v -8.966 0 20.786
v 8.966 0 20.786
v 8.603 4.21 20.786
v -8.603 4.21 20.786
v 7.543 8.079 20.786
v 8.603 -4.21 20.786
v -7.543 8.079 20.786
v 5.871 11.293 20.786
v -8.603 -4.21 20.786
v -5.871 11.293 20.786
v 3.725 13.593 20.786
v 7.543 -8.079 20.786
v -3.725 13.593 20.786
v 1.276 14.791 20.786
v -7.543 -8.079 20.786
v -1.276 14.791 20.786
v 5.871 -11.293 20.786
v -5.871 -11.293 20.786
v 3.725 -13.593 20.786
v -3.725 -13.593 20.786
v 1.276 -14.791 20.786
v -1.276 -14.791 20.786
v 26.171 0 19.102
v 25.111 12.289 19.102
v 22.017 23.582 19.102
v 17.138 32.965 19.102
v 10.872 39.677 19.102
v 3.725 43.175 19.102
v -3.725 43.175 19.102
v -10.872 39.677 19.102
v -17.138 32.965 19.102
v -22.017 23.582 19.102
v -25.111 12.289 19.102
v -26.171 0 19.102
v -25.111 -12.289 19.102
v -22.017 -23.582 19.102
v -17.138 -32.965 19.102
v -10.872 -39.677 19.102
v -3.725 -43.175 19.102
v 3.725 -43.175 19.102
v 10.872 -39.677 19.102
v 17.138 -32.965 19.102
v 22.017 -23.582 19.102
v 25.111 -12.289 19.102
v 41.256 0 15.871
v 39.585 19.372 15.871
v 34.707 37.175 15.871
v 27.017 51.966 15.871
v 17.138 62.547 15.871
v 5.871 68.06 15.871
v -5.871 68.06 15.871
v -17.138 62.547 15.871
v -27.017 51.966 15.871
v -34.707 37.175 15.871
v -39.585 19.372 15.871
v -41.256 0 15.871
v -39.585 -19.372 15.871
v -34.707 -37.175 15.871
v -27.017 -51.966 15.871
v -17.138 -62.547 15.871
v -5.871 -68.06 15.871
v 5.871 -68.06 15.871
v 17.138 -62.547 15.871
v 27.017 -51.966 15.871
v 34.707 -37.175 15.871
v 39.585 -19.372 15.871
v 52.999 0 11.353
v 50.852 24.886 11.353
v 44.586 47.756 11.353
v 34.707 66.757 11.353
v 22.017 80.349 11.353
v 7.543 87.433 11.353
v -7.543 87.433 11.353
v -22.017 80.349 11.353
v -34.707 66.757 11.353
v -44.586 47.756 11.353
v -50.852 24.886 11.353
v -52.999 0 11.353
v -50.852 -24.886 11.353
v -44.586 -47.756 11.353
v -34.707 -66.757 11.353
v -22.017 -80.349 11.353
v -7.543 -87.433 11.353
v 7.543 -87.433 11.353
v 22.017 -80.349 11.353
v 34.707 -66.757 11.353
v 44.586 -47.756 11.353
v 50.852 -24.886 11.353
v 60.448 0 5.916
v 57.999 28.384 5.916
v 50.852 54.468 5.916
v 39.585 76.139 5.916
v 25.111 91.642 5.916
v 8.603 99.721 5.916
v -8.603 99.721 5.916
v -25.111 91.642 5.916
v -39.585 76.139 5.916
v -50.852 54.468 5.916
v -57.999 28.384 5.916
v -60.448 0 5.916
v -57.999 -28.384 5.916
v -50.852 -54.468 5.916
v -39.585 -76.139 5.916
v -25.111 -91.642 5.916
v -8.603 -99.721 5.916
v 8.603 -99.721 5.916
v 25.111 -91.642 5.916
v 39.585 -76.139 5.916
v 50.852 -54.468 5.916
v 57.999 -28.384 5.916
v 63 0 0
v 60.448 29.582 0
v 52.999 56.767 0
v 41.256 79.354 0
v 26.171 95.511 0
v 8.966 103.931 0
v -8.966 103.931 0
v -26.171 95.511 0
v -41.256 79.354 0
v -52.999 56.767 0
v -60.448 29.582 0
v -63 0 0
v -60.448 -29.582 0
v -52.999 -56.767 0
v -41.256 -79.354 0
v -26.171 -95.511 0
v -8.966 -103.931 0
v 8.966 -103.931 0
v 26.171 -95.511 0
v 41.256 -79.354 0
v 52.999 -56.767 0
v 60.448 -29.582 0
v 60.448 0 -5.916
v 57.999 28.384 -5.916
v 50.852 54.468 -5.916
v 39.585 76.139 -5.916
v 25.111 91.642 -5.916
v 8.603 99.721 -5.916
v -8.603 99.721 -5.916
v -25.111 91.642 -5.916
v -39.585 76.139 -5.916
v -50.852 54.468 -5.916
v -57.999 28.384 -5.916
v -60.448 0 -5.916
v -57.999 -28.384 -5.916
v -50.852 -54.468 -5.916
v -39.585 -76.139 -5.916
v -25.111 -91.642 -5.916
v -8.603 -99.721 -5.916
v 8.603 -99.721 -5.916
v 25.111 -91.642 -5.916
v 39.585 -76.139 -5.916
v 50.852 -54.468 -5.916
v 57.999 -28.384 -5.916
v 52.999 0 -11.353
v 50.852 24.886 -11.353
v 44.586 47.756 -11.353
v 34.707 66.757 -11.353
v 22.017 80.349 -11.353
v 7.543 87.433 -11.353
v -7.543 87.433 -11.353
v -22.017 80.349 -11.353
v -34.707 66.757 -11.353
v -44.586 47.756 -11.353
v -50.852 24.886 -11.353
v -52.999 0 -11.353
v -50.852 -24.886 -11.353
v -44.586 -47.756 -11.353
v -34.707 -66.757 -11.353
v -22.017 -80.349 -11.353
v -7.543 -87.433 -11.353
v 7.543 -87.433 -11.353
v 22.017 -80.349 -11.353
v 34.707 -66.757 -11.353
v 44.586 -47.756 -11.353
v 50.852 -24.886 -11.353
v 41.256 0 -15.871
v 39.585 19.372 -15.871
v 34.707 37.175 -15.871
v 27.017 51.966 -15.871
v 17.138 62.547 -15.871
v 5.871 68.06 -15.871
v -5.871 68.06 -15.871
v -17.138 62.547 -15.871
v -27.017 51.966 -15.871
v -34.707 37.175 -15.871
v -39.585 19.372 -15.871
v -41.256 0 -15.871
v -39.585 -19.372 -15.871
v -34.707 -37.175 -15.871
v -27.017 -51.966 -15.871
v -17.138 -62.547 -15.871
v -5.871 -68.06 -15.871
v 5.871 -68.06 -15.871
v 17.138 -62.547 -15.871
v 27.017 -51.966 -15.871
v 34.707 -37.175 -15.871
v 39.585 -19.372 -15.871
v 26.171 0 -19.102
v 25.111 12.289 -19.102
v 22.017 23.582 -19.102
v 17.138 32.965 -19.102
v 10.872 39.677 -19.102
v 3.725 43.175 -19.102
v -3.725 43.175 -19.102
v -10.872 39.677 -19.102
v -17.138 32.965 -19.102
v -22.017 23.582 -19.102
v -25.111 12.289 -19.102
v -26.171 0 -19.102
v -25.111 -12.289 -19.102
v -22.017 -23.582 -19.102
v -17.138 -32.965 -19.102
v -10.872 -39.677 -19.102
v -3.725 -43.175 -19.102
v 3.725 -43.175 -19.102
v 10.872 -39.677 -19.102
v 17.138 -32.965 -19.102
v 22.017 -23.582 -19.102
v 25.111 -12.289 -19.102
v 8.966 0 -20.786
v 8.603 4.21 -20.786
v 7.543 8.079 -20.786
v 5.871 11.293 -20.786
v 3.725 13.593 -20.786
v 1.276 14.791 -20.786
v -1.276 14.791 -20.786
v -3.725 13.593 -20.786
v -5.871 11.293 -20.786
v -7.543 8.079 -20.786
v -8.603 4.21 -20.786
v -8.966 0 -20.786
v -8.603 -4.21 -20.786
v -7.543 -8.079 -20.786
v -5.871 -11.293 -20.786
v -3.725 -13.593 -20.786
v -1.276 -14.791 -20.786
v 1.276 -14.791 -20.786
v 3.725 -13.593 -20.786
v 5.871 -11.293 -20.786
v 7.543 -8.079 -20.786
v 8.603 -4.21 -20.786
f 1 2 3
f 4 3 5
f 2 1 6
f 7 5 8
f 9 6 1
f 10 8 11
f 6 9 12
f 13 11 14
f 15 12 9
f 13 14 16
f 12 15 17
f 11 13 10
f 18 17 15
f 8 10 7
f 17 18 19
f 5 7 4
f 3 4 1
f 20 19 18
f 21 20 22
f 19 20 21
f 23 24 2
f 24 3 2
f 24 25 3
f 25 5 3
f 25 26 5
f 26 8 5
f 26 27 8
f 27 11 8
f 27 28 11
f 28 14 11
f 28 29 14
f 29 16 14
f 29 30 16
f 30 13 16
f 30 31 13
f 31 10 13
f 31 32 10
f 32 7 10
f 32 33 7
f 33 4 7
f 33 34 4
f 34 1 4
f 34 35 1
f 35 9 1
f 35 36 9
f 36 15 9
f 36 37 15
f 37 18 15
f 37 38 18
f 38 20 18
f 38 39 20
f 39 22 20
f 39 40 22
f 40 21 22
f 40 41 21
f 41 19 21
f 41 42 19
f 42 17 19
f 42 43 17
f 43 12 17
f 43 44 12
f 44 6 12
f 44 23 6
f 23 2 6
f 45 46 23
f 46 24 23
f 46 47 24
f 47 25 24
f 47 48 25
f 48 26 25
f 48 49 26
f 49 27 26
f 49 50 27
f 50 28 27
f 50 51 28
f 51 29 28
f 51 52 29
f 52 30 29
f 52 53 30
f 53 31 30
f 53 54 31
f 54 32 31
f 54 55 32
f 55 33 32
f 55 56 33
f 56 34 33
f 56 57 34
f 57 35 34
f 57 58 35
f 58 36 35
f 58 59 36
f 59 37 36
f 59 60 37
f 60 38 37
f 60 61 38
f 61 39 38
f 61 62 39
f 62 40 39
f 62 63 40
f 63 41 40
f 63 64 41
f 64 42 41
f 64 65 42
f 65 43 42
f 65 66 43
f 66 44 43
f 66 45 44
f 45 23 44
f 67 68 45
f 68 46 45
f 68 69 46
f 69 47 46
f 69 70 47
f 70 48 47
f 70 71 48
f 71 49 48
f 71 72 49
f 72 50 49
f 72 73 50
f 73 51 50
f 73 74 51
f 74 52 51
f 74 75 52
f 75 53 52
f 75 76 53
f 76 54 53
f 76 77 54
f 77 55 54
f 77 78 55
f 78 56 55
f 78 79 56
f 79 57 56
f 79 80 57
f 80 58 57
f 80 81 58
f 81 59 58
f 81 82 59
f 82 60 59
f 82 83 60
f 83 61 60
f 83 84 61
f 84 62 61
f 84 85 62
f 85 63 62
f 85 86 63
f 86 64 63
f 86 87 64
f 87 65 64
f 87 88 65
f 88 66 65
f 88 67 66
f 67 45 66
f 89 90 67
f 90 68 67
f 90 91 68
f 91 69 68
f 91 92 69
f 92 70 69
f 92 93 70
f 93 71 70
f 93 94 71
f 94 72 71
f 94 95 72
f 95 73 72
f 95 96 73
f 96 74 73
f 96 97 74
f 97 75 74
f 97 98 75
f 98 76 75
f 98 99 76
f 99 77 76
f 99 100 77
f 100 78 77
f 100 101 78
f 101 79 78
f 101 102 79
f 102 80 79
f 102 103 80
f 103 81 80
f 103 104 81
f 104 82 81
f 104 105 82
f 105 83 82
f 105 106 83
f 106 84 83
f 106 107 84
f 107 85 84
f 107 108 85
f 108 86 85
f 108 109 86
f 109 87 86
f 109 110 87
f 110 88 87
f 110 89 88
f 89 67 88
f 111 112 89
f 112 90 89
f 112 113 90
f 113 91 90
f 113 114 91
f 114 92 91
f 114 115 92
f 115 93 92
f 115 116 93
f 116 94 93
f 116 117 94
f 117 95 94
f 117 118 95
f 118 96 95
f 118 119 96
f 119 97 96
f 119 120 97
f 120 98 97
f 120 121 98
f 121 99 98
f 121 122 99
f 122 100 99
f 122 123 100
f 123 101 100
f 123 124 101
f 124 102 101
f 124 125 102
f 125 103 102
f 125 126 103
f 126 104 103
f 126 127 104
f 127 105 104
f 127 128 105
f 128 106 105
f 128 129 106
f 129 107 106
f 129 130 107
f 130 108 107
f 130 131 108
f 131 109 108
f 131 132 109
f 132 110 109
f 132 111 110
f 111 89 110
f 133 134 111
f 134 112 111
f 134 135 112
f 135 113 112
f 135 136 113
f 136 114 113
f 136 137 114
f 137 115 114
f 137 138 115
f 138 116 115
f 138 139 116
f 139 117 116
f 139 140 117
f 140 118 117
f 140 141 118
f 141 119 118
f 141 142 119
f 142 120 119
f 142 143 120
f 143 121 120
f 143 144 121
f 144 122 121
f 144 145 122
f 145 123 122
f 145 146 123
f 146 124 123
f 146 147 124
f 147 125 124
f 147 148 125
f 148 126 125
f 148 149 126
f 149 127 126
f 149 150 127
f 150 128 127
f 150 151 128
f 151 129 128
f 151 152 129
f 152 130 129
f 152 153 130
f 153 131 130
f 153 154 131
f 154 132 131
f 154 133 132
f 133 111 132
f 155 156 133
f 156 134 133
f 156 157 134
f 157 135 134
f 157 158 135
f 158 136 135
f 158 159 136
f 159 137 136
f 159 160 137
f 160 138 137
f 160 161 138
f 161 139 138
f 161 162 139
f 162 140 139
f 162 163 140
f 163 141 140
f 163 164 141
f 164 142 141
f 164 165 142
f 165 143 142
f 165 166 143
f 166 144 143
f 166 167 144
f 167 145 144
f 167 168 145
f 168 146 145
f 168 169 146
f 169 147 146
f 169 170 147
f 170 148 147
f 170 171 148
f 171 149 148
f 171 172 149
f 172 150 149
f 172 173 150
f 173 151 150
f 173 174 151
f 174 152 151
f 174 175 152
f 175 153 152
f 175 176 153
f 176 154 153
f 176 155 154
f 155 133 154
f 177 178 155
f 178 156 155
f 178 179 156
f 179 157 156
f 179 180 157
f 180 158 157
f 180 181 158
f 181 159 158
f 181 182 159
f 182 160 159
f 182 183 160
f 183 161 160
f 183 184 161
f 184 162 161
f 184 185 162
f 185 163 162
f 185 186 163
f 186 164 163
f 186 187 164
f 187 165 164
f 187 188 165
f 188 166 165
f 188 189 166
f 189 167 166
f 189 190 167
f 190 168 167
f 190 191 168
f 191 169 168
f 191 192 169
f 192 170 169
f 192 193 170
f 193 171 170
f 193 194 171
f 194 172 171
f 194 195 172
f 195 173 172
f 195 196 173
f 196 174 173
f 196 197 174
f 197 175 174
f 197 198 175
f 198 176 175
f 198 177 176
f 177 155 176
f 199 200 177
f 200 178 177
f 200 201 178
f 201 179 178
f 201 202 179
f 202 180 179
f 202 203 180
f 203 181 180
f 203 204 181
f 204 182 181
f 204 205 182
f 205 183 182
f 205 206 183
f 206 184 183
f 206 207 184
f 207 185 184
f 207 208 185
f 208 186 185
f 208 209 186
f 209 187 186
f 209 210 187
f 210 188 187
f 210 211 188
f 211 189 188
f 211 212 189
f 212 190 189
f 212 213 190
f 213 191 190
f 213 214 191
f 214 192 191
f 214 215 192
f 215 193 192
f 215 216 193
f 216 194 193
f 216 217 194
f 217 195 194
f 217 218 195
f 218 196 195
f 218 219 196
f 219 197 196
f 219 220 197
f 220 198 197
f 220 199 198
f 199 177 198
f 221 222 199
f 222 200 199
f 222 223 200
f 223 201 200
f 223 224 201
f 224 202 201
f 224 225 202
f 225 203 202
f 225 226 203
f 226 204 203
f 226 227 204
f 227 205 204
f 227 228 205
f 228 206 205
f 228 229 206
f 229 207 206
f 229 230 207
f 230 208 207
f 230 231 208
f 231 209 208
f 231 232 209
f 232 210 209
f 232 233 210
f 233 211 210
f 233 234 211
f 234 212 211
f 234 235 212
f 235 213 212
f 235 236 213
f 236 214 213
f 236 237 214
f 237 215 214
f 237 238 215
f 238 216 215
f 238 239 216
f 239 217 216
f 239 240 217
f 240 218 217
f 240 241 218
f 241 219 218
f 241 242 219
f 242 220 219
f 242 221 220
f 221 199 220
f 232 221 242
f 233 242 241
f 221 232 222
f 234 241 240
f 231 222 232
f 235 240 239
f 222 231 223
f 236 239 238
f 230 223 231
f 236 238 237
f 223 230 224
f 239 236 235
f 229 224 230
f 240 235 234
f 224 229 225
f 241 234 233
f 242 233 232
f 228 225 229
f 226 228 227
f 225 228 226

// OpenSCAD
// Generated by SolidPython 1.0.1 on 2020-07-29 00:46:49


scale(v = [9, 15, 3]) {
	sphere(r = 7);
}
/***********************************************
*********      SolidPython code:      **********
************************************************
 
# import packages: SolidPython
from solid import *
from solid.utils import *
from itertools import chain, combinations, permutations


class Resize:

    def __init__(self, scad_file):
        self.scad_file = scad_file
        #self.scad_file = import_scad(scad_file)
        # cone/cylinder param:
        self.r1 = 0
        self.r2 = 0
        self.h = 0
        # rectangular prism param:
        self.w = 0
        self.l = 0
        # ellipse param:
        self.r = 0

    # import OpenScad code (file name corresponds to shape)


    # classify shape + parameters
    def assign(self, param1, param2, param3):
        if self.scad_file == 'cone.scad':
            self.r1 = param1
            self.r2 = param2
            self.h = param3
        elif self.scad_file == 'cylinder.scad':
            self.r1 = param1
            self.r2 = param2
            self.h = param3
        elif self.scad_file == 'rectangularPrism.scad':
            self.h = param1
            self.l = param2
            self.w = param3
        else:
            self.r = param1
            self.h = param2

    # resize parameters
    def iterate(self):
        x = range(3, 20, 2)
        i = 1
        if self.scad_file == 'cone.scad':
            tempList = list(permutations(x, 2))
            for temp in tempList:
                param1 = temp[0]
                param2 = temp[1]
                filepath = 'produced_scad_files/' + 'cone' + str(param1) + '_' + str(param2) + '_' + '.scad'
                scad_render_to_file(cylinder(h=param1, r1=param2, r2=0), filepath)

        elif self.scad_file == 'cylinder.scad':
            tempList = list(permutations(x, 3))
            for temp in tempList:
                param1 = temp[0]
                param2 = temp[1]
                filepath = 'produced_scad_files/' + 'cylinder' + str(param1) + '_' + str(param2) + '_' + '.scad'
                scad_render_to_file(cylinder(h=param1, r1=param2, r2=param2), filepath)

        elif self.scad_file == 'rectangularPrism.scad':
            tempList = list(permutations(x, 3))
            for temp in tempList:
                param1 = temp[0]
                param2 = temp[1]
                param3 = temp[2]
                filepath = 'produced_scad_files/' + 'rectangularPrism' + str(param1) + '_' + str(param2) + '_' + str(
                    param3) + '.scad'
                scad_render_to_file(cube(size=(param1, param2, param3)), filepath)

        elif self.scad_file == 'ellipse.scad':
            tempList = list(permutations(x, 4))
            for temp in tempList:
                param1 = temp[0]
                param2 = temp[1]
                param3 = temp[2]
                param4 = temp[3]
                filepath = 'produced_scad_files/' + 'ellipse' + str(param1) + '_' + str(param2) + '_' + str(param3) + '_' + str(param4) + '.scad'
                scad_render_to_file(scale([param1, param2, param3])(sphere(r=param4)), filepath)

    def render_to_scadfile(self):
        scad_render_to_file(scad, 'example.scad') 
 
************************************************/
